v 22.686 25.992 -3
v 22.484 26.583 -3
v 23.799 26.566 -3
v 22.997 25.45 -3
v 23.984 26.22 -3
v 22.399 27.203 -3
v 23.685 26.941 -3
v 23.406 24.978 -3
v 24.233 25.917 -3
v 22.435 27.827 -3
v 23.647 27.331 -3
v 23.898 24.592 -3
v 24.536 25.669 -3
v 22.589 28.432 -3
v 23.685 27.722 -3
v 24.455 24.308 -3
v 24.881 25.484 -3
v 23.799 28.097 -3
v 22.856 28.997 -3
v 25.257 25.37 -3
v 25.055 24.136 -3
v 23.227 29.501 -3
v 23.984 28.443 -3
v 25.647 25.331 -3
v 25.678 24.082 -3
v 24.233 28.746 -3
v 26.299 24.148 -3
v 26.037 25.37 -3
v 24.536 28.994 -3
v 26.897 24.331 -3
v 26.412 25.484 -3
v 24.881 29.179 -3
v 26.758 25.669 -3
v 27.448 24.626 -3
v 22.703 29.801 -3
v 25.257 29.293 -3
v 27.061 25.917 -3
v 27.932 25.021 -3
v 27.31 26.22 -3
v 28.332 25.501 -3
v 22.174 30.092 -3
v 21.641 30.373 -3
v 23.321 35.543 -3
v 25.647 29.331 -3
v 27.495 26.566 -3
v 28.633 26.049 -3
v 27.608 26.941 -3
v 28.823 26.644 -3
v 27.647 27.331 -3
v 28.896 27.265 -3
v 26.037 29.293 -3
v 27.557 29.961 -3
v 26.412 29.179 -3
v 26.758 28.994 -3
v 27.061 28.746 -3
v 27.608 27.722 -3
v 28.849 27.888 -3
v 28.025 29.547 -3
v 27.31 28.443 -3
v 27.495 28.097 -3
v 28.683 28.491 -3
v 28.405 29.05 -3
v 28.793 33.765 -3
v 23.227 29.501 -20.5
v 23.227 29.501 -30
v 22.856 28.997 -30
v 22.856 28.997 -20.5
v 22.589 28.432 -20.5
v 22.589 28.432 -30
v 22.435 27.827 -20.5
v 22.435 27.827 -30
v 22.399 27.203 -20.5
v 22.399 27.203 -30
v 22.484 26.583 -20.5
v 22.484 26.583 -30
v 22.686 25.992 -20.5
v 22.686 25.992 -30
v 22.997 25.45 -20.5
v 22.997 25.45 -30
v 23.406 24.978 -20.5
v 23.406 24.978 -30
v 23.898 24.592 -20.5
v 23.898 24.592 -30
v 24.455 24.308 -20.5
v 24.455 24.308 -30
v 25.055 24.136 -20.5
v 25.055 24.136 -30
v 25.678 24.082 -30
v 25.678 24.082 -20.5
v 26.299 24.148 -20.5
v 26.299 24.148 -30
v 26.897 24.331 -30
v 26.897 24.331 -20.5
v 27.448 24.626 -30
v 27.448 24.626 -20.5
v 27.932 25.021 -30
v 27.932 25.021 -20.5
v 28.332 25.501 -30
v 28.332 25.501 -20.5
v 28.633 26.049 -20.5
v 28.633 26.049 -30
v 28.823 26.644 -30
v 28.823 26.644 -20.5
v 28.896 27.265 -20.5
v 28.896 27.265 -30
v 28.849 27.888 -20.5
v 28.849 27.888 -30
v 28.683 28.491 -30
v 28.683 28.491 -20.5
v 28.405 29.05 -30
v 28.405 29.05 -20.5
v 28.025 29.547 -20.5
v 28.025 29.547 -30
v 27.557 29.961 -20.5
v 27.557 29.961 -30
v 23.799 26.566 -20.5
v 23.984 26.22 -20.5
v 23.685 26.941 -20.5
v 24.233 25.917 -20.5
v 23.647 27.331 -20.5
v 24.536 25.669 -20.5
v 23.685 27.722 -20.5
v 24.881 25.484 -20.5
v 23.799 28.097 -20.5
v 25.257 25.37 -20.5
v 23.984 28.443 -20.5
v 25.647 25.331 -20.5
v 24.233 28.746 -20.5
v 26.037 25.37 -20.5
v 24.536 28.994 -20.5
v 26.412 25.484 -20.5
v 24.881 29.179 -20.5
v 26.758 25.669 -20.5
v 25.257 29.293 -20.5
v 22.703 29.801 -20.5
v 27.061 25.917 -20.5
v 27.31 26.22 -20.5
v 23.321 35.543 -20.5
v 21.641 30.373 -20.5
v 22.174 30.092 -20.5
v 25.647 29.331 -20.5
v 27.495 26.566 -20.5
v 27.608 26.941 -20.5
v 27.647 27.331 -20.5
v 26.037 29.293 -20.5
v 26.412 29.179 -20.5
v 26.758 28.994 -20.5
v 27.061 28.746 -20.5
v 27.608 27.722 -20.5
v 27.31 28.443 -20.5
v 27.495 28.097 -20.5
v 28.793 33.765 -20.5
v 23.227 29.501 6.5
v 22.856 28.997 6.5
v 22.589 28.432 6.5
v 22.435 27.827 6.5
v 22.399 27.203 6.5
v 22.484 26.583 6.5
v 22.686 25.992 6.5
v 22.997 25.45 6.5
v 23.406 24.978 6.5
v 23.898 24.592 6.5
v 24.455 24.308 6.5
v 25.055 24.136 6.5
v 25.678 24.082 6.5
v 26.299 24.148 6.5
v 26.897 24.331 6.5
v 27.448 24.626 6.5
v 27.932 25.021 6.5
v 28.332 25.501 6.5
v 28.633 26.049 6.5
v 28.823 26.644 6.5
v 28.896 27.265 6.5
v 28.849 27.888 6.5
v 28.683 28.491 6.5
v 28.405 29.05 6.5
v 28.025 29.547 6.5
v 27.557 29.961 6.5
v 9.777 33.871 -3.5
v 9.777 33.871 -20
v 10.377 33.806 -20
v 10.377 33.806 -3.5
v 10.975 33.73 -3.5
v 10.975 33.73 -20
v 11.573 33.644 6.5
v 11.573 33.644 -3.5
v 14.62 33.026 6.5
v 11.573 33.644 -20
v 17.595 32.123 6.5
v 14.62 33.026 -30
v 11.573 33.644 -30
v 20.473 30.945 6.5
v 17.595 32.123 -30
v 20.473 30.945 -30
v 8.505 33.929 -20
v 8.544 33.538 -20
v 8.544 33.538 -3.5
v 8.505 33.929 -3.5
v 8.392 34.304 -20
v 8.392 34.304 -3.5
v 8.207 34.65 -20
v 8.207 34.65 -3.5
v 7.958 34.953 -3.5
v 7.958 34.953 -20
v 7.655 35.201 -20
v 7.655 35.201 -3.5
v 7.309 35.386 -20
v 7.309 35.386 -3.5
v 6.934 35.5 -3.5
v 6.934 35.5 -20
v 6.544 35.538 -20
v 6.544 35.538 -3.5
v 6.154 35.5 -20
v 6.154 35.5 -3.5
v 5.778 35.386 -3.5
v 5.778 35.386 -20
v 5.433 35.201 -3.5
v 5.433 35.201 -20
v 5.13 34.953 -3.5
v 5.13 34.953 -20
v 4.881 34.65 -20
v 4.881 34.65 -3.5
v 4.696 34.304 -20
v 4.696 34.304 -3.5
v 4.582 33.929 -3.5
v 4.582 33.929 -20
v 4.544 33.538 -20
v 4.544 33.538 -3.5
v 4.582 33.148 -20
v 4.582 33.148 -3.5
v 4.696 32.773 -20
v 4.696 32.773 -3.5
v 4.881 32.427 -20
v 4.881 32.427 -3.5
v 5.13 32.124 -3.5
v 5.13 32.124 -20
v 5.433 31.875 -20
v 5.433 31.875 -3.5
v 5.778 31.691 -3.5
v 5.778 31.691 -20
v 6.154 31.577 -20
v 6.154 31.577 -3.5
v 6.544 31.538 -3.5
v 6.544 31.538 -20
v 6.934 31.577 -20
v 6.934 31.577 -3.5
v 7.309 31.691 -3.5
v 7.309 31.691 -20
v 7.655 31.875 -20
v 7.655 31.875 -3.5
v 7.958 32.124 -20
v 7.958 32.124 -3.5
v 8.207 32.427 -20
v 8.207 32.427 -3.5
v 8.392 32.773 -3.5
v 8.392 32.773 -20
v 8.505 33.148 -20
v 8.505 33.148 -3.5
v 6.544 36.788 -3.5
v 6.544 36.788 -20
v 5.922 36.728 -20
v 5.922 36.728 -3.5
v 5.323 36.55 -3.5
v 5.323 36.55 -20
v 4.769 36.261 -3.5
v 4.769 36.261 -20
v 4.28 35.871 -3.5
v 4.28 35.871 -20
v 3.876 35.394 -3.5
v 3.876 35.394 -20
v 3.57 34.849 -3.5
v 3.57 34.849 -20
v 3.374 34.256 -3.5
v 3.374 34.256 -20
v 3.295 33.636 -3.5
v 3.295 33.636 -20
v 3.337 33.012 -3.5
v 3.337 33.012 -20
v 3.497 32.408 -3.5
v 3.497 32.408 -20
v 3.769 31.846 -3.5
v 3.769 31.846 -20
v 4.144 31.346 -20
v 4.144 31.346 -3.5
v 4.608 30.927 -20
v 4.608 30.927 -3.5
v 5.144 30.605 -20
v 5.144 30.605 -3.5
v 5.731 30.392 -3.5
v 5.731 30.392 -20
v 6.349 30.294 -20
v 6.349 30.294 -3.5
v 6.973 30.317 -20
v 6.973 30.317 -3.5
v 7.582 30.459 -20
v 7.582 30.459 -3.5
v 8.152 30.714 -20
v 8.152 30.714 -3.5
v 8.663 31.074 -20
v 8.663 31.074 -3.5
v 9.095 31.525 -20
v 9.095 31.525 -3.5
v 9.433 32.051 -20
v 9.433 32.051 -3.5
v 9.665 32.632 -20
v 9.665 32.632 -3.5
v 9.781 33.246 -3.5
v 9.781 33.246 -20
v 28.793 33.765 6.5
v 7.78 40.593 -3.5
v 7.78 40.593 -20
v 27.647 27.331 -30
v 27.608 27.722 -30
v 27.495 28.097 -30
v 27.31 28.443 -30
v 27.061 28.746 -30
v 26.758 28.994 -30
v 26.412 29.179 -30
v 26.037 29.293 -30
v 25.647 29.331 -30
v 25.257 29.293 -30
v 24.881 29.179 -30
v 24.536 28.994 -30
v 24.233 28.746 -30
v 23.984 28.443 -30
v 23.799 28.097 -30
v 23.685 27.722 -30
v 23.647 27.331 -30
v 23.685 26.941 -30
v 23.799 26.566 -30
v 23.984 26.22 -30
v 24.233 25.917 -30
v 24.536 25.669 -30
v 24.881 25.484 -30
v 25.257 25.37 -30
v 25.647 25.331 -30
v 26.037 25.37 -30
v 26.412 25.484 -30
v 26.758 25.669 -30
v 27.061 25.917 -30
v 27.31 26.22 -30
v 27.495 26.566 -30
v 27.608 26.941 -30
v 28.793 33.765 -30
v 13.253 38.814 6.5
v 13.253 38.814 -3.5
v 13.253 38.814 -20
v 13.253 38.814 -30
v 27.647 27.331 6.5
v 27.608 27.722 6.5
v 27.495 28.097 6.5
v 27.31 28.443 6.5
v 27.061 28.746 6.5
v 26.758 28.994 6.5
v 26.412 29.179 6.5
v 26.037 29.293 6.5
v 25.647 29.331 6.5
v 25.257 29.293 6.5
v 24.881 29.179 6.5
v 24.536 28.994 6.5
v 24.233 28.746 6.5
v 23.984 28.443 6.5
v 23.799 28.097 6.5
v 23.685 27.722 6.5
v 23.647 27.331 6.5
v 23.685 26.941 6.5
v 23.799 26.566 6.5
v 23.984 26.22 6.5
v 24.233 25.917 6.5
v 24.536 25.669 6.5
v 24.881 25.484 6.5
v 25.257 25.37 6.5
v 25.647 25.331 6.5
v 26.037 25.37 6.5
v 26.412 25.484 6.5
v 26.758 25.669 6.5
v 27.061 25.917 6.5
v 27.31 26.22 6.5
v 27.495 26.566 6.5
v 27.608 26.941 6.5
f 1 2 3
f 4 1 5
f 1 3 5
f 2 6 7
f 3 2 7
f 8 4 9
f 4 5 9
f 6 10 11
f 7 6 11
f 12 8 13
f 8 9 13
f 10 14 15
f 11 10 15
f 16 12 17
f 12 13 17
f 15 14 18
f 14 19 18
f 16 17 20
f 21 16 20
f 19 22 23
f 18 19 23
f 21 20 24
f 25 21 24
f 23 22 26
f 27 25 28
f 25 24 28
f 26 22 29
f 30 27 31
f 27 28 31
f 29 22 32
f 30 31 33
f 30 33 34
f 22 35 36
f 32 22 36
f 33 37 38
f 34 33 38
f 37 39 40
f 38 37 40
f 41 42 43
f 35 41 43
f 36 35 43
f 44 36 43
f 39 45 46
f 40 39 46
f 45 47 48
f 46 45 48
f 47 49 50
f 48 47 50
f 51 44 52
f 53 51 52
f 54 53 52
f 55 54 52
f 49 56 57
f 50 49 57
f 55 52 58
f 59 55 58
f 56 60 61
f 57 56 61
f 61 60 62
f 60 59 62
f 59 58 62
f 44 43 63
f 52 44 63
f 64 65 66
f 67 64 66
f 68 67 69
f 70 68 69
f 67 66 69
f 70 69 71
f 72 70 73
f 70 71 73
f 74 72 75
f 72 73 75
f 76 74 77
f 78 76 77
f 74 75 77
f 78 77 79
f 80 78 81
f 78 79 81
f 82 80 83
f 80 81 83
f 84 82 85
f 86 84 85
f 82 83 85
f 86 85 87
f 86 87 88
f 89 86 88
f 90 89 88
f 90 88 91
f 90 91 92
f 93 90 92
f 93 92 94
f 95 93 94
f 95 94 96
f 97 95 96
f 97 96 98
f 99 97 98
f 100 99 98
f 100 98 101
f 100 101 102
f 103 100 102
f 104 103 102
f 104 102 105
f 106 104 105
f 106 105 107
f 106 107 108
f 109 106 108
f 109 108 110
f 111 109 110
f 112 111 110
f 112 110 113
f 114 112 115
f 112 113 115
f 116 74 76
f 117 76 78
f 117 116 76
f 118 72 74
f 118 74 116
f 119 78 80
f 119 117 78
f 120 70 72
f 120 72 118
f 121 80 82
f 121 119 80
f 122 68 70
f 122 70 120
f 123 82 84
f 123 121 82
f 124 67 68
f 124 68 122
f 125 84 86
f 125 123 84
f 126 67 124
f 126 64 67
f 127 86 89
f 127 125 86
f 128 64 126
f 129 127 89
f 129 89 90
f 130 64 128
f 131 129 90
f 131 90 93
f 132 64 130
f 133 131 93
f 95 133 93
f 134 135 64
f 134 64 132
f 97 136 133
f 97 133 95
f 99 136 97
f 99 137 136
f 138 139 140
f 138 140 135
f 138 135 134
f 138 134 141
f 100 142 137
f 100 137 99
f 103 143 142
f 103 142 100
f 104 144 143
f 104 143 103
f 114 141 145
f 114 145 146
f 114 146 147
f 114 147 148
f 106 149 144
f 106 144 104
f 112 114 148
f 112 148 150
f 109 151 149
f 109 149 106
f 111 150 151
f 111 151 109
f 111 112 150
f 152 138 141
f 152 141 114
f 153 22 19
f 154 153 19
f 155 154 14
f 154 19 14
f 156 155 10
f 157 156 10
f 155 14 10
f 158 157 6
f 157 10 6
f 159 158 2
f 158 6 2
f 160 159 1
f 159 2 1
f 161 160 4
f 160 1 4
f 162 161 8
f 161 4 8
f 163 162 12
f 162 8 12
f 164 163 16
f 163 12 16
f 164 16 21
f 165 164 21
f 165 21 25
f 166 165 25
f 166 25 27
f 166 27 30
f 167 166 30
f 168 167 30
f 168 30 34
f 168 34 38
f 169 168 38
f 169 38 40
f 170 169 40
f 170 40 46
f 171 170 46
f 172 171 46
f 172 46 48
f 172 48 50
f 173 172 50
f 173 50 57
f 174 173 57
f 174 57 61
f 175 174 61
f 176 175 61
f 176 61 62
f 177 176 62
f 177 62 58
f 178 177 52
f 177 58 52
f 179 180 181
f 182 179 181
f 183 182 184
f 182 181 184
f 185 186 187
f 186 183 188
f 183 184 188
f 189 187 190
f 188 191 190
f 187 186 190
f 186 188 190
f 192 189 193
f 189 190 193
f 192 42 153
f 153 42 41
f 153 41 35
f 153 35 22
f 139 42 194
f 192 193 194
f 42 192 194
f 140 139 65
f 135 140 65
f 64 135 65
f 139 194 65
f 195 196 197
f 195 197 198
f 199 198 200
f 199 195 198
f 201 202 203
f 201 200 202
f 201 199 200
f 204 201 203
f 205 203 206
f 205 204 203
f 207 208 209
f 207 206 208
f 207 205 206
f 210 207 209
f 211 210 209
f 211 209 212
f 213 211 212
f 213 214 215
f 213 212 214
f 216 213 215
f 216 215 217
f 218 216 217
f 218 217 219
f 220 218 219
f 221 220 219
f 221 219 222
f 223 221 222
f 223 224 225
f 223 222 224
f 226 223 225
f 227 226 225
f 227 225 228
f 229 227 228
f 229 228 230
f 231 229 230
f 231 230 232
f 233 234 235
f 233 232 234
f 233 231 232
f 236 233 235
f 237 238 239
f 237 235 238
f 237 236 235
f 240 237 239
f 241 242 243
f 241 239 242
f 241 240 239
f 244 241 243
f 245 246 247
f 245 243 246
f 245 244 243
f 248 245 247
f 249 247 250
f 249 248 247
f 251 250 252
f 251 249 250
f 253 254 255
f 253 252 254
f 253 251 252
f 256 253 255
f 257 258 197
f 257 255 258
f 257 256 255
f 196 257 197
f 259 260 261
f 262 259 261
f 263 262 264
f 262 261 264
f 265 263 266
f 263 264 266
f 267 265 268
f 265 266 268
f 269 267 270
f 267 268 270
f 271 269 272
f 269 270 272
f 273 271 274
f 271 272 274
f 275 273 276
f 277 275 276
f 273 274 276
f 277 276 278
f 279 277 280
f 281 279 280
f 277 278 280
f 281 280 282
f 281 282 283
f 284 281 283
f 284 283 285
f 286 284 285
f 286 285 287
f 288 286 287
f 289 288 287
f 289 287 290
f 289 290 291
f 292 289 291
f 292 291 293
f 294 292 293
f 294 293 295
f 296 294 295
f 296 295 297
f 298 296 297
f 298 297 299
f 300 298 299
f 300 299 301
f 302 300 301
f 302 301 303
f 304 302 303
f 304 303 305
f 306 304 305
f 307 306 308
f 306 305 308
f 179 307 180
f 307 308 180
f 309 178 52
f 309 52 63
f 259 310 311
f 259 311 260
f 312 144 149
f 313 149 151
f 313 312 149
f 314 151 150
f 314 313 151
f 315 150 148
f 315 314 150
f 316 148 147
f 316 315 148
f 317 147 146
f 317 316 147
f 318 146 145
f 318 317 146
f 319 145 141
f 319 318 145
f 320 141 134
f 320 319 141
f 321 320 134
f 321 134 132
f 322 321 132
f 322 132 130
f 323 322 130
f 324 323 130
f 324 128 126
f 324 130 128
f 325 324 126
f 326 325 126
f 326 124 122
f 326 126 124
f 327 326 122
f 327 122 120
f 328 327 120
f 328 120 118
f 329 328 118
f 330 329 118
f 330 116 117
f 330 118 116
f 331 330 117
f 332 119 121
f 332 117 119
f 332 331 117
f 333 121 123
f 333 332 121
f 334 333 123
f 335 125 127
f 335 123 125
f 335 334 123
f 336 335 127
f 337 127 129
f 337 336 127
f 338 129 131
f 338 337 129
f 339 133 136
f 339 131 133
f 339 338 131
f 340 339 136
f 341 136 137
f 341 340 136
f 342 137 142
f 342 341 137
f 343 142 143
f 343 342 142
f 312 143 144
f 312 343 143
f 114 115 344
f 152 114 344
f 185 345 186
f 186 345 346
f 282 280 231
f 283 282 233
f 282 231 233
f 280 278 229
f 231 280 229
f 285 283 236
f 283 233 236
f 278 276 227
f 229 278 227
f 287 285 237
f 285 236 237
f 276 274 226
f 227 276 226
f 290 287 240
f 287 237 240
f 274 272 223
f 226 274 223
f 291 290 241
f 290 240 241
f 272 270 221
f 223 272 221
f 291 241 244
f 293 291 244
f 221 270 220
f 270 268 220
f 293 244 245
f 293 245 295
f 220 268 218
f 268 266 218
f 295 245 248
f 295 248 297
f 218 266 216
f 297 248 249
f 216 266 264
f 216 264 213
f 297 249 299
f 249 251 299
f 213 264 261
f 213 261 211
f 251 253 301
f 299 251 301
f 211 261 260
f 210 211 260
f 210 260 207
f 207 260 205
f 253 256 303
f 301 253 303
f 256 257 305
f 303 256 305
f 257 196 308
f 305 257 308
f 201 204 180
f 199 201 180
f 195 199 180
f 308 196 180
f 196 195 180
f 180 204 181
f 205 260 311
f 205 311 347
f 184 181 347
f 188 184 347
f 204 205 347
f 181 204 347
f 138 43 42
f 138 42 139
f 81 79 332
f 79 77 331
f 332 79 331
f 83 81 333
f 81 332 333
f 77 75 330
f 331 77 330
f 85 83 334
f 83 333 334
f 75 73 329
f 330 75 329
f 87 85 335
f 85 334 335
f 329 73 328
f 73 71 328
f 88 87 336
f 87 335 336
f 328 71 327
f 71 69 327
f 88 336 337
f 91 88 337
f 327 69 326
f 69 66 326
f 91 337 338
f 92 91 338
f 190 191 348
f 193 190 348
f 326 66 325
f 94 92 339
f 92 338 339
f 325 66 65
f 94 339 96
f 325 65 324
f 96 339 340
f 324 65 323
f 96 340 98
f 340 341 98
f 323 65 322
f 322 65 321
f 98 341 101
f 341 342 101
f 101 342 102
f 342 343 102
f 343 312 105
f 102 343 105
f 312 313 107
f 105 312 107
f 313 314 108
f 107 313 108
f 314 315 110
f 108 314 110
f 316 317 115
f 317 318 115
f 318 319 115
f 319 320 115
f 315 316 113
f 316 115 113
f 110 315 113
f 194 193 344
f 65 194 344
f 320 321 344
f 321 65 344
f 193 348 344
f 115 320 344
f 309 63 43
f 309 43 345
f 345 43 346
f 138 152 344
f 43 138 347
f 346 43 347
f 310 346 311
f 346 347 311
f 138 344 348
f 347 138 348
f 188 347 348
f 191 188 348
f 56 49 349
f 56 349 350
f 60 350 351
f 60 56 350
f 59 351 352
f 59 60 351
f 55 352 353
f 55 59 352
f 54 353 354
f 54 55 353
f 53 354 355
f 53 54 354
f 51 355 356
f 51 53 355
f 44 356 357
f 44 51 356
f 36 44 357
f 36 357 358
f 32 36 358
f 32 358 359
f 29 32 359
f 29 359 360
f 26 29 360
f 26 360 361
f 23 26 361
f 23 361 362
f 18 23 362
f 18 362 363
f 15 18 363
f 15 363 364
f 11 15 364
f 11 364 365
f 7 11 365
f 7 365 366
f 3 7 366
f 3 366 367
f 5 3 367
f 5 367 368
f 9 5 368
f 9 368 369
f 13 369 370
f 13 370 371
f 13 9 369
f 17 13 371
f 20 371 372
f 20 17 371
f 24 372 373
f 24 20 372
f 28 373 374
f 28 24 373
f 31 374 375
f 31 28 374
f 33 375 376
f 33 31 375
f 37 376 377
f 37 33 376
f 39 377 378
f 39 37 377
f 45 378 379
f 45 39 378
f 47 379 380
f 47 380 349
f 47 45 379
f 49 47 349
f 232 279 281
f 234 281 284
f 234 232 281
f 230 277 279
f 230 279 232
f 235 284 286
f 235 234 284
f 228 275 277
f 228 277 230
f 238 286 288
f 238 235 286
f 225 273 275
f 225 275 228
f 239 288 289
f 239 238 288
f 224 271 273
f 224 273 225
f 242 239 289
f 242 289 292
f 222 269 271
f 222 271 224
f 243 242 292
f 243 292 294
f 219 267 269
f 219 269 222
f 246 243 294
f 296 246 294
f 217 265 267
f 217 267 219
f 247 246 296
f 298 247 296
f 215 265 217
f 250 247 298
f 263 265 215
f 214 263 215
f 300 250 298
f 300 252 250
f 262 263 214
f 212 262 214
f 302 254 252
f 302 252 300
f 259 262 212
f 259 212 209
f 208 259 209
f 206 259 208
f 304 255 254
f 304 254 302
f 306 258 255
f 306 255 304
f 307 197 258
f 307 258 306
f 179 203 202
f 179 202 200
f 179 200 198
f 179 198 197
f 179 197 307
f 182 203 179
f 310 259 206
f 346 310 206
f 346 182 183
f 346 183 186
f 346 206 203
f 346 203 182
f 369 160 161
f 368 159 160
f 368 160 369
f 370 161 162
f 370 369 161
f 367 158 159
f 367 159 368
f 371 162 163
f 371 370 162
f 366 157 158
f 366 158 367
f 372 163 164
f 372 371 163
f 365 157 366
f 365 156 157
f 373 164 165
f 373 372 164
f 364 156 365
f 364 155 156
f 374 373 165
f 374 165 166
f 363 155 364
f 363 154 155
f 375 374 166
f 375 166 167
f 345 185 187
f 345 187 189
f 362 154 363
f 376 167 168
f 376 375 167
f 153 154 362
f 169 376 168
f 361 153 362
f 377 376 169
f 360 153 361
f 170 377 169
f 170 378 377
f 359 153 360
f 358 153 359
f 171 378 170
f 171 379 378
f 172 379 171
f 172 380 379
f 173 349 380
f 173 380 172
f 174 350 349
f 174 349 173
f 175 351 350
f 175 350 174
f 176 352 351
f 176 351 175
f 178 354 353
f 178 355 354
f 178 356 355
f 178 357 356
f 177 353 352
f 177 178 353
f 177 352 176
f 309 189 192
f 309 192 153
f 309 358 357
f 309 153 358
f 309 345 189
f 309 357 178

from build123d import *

# Parameters (mm, degrees)
SALIENTE_EXTRUIR1_DEPTH      = 6.5
SALIENTE_EXTRUIR1_DEPTH_BACK = 30
CROQUIS1_R                   = 2
CROQUIS2_W                   = 8
CROQUIS2_H                   = 10
CROQUIS2_H_2                 = 17.5
CORTAR_EXTRUIR2_DEPTH        = 20


with BuildPart() as part:
    # Croquis1 → Saliente-Extruir1 (new, two sides: drawn at the far end of the back side and taken through both)
    with BuildSketch(Plane.XY.offset(-SALIENTE_EXTRUIR1_DEPTH_BACK)):
        with BuildLine():
            Line((28.793175074, 33.764978898), (7.779852304, 40.592621349))
            Line((7.779852304, 40.592621349), (6.543784327, 36.788395284))
            ThreePointArc((6.543784327, 36.788395284), (4.366334456, 31.125676473), (9.776753104, 33.870679629))
            ThreePointArc((9.776753104, 33.870679629), (16.738586943, 32.414771462), (23.226590181, 29.500562652))
            ThreePointArc((23.226590181, 29.500562652), (25.990238441, 24.099644159), (27.557107096, 29.960752833))
            Line((27.557107096, 29.960752833), (28.793175074, 33.764978898))
        make_face()
        with Locations((6.543784327, 33.538395284)):
            Circle(CROQUIS1_R, mode=Mode.SUBTRACT)
        with Locations((25.646805026, 27.331447601)):
            Circle(CROQUIS1_R, mode=Mode.SUBTRACT)
    extrude(amount=SALIENTE_EXTRUIR1_DEPTH + SALIENTE_EXTRUIR1_DEPTH_BACK)

    # Croquis2 → Cortar-Extruir2 (cut)
    with BuildSketch(Plane(origin=(12.672781879, 39.002812158, 0), x_dir=(0.9510565162951536, -0.3090169943749473, 0), z_dir=(0.3090169943749473, 0.9510565162951536, 0))):
        with Locations((-3.390425382, 25)):
            Rectangle(CROQUIS2_W, CROQUIS2_H)
        with Locations((-3.390425382, -1.5)):
            Rectangle(CROQUIS2_W, CROQUIS2_H)
        with Locations((15.195679253, 11.75)):
            Rectangle(CROQUIS2_W, CROQUIS2_H_2)
    extrude(amount=-CORTAR_EXTRUIR2_DEPTH, mode=Mode.SUBTRACT)


solid = part.part
